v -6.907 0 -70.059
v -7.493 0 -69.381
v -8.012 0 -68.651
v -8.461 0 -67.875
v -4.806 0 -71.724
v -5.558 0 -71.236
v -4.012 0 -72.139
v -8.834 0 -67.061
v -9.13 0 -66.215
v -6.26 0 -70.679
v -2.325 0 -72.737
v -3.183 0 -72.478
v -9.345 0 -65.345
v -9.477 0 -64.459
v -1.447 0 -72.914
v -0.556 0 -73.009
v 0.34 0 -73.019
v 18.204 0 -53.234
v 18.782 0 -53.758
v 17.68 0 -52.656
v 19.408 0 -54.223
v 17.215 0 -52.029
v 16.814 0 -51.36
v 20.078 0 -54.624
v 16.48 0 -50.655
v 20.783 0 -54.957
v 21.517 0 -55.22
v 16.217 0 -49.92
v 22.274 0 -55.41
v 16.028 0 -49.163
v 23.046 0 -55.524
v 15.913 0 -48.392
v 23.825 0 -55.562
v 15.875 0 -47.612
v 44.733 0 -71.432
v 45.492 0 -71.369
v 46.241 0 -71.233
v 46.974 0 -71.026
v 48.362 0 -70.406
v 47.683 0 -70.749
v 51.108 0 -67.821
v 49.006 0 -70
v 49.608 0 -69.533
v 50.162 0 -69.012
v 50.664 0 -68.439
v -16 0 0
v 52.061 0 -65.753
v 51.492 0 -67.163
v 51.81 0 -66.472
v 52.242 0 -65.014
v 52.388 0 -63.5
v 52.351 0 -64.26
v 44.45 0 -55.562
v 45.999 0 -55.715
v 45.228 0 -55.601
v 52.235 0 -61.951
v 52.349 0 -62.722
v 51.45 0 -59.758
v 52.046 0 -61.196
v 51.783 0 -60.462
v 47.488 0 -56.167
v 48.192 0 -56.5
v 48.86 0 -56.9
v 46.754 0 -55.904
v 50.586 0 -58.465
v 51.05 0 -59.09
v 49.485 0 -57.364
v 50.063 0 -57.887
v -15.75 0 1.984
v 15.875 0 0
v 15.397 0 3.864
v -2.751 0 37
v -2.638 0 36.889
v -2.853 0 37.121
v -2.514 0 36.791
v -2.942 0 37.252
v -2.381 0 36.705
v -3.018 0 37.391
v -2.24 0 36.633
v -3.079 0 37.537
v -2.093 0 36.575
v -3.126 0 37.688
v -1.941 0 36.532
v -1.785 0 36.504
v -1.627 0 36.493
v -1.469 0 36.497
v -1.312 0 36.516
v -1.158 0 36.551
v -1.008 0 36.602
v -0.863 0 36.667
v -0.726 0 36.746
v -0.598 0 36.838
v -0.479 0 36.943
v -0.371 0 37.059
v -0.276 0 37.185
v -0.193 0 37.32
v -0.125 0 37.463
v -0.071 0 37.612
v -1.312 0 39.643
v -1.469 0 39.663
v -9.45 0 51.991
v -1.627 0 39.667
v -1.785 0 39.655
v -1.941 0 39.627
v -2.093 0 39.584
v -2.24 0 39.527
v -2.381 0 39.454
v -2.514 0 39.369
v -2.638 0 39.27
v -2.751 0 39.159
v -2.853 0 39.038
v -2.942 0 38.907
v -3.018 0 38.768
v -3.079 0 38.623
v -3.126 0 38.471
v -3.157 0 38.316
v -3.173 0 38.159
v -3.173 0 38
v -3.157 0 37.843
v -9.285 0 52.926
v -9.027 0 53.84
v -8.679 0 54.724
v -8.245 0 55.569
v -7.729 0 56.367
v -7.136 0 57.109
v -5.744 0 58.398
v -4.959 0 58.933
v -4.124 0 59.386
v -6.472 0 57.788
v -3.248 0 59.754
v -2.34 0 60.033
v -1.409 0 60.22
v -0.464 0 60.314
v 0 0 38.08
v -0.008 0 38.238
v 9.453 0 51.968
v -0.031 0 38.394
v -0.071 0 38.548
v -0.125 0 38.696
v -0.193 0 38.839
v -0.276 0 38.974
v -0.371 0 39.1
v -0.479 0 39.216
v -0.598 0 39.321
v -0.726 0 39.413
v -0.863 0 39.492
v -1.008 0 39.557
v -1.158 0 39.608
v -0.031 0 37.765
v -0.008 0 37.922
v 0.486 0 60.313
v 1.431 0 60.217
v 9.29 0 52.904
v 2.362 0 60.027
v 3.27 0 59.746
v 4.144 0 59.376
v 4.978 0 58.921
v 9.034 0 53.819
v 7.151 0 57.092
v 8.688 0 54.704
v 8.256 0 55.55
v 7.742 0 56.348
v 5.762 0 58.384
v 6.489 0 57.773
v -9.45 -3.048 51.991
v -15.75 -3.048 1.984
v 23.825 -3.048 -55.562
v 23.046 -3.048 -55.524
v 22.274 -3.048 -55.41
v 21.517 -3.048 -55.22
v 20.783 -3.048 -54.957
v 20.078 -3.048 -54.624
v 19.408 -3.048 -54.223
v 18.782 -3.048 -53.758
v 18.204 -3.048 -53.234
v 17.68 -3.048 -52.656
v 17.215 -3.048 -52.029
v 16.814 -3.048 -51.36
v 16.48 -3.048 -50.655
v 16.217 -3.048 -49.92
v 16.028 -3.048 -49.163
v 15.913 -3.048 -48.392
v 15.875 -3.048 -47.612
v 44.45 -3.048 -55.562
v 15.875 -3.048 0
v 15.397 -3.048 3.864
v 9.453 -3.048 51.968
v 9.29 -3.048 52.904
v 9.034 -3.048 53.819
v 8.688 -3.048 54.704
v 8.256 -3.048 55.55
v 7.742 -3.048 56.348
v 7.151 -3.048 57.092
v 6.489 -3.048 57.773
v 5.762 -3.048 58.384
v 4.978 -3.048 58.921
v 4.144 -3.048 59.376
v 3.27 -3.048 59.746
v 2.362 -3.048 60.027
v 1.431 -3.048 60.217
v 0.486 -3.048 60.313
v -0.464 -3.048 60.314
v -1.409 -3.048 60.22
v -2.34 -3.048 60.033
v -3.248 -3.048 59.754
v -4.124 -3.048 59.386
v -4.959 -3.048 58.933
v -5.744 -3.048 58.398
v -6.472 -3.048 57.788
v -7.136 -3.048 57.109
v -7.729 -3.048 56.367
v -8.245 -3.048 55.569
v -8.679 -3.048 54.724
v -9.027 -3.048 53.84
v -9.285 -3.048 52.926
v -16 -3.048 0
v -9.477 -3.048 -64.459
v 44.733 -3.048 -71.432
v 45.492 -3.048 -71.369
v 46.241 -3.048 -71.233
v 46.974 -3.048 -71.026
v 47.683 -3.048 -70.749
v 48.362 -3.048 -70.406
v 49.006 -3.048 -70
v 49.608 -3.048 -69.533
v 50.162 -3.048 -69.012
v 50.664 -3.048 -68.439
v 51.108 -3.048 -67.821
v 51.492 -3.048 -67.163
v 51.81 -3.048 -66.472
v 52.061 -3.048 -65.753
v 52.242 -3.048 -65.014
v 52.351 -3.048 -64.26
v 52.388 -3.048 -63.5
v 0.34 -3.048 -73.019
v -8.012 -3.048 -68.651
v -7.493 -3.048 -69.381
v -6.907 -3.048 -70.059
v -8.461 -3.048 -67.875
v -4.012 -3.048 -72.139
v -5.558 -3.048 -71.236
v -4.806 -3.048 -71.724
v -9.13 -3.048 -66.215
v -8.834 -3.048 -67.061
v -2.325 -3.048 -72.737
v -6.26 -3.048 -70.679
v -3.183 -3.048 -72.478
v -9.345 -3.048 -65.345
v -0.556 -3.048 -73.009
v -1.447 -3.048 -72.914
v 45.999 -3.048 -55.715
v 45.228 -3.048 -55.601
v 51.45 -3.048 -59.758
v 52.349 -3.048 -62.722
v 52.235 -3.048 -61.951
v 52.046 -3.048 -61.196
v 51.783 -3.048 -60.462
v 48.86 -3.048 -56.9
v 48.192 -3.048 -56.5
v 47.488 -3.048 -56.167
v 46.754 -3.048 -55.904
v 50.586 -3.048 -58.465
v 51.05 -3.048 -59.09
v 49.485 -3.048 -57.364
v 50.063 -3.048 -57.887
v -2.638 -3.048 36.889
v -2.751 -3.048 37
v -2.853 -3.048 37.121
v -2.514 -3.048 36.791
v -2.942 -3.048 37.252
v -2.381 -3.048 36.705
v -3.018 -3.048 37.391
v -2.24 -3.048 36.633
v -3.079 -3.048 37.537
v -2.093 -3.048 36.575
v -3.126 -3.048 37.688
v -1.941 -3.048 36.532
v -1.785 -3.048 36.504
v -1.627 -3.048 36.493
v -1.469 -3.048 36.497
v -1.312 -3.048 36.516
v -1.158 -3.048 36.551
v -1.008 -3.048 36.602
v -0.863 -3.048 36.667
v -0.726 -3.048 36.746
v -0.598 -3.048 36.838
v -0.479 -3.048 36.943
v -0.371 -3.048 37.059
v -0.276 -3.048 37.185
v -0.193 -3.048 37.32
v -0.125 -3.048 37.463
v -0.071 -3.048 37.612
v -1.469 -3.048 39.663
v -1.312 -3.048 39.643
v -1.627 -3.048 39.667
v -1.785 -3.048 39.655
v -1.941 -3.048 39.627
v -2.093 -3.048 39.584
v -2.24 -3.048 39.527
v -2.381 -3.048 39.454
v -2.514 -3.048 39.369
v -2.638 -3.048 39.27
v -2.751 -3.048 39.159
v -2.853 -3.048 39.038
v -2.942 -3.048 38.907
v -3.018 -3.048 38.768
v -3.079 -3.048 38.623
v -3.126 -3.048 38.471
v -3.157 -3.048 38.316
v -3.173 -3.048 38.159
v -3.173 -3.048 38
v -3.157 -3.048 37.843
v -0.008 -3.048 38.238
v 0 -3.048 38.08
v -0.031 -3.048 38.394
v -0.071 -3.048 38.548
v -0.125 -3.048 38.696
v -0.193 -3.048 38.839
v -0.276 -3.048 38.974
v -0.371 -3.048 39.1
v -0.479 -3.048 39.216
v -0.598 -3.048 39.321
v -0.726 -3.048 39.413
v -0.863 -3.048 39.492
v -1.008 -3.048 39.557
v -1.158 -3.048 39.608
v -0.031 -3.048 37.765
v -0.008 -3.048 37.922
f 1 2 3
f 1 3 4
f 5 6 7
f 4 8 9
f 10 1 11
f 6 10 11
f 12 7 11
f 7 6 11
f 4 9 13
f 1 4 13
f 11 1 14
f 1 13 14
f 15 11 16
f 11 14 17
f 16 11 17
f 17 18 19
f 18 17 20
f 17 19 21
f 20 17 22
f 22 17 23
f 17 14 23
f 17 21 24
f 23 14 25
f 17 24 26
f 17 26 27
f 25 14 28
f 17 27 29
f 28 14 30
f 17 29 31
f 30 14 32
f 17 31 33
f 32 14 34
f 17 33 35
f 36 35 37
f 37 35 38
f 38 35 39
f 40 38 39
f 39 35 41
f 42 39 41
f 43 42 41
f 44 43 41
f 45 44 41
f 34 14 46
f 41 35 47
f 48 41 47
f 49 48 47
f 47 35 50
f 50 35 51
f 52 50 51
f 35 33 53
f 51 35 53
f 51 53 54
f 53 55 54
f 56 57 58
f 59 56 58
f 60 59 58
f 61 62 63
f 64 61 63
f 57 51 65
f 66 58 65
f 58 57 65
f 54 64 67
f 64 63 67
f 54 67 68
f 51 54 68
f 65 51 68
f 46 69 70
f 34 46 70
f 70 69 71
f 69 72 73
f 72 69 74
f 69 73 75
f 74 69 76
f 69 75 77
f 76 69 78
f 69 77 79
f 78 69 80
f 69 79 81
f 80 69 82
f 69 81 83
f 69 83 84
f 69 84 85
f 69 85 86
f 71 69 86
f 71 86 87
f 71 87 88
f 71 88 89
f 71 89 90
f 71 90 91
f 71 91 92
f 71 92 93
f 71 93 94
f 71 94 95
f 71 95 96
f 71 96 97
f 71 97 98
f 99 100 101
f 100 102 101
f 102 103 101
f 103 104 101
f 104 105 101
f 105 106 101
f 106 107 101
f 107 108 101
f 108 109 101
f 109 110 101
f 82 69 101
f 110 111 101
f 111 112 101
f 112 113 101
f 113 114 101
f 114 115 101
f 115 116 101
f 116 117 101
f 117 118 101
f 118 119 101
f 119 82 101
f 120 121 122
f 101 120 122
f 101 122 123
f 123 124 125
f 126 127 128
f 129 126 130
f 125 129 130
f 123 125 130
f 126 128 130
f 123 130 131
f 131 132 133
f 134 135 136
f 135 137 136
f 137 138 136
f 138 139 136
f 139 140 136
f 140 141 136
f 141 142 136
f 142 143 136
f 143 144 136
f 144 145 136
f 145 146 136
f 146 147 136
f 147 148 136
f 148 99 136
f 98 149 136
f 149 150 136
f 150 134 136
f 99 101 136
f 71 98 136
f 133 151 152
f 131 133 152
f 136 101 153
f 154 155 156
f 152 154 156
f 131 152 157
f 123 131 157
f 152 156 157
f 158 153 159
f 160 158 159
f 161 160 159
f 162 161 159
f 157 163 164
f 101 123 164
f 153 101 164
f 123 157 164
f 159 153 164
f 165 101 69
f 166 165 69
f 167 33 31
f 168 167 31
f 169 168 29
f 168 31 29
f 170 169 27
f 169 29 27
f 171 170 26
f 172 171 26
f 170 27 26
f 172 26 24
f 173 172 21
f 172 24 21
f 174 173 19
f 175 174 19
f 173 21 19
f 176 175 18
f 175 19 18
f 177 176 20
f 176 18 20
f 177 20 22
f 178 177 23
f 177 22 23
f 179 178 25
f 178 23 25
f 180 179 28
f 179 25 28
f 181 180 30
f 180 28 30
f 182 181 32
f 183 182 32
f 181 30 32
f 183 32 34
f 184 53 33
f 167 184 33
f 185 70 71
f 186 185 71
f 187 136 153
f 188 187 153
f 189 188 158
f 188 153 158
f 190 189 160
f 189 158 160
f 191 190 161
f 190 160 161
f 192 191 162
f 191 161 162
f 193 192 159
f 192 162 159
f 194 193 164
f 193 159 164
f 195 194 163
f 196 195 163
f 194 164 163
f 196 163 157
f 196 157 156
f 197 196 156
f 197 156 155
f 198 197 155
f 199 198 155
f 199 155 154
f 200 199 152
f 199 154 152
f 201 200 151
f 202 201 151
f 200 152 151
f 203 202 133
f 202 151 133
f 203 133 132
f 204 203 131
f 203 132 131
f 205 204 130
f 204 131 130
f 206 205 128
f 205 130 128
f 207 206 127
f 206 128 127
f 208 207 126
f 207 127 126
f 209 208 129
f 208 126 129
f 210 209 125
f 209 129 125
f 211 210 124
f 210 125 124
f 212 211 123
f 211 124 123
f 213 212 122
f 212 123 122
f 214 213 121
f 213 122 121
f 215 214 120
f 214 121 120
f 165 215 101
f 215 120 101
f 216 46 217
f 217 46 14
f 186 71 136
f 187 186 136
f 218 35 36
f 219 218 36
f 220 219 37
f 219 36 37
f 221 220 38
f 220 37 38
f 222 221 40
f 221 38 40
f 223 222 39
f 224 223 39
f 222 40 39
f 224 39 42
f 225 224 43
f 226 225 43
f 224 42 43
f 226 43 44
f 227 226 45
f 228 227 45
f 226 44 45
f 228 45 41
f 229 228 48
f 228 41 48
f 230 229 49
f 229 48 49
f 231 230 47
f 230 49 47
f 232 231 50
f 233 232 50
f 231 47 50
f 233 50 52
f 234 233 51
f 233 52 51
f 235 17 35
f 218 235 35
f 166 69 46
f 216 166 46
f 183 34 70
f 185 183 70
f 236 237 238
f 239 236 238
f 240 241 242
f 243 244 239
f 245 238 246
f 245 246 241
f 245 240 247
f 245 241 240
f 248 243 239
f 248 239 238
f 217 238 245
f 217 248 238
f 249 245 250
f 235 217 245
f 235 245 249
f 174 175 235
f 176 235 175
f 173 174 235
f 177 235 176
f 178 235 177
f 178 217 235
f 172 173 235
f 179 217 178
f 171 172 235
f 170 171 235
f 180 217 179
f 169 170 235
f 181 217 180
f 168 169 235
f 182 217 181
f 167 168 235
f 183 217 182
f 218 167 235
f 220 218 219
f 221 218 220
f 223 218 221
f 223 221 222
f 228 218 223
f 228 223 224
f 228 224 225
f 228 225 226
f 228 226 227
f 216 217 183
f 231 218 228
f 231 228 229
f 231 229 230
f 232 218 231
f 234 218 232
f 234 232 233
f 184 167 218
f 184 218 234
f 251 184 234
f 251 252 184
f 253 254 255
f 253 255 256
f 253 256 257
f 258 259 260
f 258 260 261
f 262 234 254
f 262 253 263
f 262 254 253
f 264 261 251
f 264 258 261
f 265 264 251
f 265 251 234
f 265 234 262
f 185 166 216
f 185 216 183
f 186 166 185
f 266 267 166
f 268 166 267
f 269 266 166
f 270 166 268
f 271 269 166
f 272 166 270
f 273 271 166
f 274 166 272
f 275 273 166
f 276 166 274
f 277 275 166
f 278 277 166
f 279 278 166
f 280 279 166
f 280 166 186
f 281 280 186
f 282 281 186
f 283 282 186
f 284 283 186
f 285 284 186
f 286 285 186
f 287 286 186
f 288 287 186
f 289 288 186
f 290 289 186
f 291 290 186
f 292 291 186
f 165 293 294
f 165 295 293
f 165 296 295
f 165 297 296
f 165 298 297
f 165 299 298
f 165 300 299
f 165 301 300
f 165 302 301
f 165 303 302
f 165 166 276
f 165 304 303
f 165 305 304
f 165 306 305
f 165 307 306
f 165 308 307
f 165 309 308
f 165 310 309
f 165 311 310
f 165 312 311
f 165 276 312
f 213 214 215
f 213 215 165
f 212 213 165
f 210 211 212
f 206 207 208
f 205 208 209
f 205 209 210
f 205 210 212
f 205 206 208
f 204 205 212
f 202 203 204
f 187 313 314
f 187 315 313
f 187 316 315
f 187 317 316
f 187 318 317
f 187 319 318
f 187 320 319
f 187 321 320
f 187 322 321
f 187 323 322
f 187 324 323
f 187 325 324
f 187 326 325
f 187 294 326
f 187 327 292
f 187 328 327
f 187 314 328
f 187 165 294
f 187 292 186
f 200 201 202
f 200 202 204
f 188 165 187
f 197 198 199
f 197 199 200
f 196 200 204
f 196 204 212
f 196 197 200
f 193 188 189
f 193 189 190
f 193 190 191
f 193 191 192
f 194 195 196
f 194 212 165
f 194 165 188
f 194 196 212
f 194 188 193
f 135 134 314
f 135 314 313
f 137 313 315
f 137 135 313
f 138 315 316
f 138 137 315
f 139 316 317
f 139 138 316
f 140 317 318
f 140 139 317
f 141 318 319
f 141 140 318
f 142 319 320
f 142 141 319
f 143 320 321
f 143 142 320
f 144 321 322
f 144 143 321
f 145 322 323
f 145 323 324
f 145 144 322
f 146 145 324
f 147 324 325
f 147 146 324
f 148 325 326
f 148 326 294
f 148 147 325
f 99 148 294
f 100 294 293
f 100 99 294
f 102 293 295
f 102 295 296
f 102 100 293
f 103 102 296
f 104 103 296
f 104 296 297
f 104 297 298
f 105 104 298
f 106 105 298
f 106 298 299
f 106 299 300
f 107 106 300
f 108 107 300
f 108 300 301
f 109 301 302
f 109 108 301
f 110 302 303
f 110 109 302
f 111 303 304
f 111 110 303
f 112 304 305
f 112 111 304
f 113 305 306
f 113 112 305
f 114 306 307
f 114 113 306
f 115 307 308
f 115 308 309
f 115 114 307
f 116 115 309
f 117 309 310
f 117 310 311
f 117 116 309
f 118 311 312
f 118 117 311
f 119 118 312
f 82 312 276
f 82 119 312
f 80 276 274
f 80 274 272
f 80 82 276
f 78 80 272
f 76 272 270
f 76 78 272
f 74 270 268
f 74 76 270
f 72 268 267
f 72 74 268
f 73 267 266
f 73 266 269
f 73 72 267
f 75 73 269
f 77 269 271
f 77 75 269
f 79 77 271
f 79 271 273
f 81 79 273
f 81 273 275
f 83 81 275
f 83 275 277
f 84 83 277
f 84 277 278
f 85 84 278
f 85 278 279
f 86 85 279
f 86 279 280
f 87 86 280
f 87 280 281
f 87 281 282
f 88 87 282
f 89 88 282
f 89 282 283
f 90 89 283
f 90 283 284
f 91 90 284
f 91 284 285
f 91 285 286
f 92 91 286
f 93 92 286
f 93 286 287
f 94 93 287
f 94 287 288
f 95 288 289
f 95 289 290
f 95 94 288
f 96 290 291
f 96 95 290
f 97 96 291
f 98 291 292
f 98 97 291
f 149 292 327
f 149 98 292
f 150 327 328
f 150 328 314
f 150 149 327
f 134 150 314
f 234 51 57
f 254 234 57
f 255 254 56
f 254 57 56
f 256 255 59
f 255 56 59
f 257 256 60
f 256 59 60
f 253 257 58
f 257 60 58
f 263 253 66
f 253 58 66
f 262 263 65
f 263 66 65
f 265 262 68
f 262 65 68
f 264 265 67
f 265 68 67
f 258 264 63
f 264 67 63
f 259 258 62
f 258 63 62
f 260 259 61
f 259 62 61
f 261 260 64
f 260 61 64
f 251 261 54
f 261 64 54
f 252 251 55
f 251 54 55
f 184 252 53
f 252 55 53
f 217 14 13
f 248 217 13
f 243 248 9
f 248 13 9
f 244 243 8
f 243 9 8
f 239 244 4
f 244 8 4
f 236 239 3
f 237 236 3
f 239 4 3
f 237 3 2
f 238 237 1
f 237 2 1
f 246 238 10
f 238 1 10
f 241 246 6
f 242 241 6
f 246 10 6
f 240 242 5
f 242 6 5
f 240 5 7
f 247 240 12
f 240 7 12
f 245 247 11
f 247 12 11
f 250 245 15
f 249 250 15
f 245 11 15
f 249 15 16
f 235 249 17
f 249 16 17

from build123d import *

# Parameters (mm, degrees)
F0_R     = 1.5875
F1_DEPTH = 3.048


with BuildPart() as f1:
    # F0 (on Front) → F1 (new body)
    with BuildSketch(Plane.XZ):
        with BuildLine():
            Line((0, 38.0796237513), (0, 41.275))
            ThreePointArc((0, 41.275), (-7.14375, 44.4998046905), (-9.4502929642, 51.990625))
            Line((-9.4502929642, 51.990625), (-15.7504883039, 1.9843747602))
            ThreePointArc((-15.7504883039, 1.9843747602), (-10.5003256064, 11.9062499201), (0, 15.875))
            Line((0, 15.875), (0, 38.0796237513))
        make_face()
        with Locations((-1.5875, 38.0796237513)):
            Circle(F0_R, mode=Mode.SUBTRACT)
        with BuildLine():
            ThreePointArc((9.525, 50.8), (6.7351920908, 44.0648079092), (0, 41.275))
            Line((0, 41.275), (0, 38.0796237513))
            Line((0, 38.0796237513), (0, 15.875))
            ThreePointArc((0, 15.875), (9.76389722, 12.5172655192), (15.3974543628, 3.8644565138))
            Line((15.3974543628, 3.8644565138), (9.4530967593, 51.9681552373))
            ThreePointArc((9.4530967593, 51.9681552373), (9.5070071956, 51.3851830343), (9.525, 50.8))
        make_face()
        with BuildLine():
            ThreePointArc((15.3974543628, 3.8644565138), (9.76389722, 12.5172655192), (0, 15.875))
            Line((0, 15.875), (0, -15.875))
            ThreePointArc((0, -15.875), (11.2253201513, -11.2253201513), (15.875, 0))
            Line((15.875, 0), (15.3974543628, 3.8644565138))
        make_face()
        with BuildLine():
            Line((0, -15.875), (0, 15.875))
            ThreePointArc((0, 15.875), (-10.5003256064, 11.9062499201), (-15.7504883039, 1.9843747602))
            ThreePointArc((-15.7504883039, 1.9843747602), (-11.9062499201, -10.5003256064), (0, -15.875))
        make_face()
        with BuildLine():
            ThreePointArc((15.875, 0), (11.2253201513, -11.2253201513), (0, -15.875))
            Line((0, -15.875), (0, -53.975))
            ThreePointArc((0, -53.975), (6.7351920908, -56.7648079092), (9.525, -63.5))
            Line((9.525, -63.5), (36.5125, -63.5))
            ThreePointArc((36.5125, -63.5), (38.8373399243, -57.8873399243), (44.45, -55.5625))
            Line((44.45, -55.5625), (23.8252, -55.5625))
            ThreePointArc((23.8252, -55.5625), (18.2035596682, -53.2339403318), (15.875, -47.6123))
            Line((15.875, -47.6123), (15.875, 0))
        make_face()
        with BuildLine():
            ThreePointArc((0, -15.875), (-11.9062499201, -10.5003256064), (-15.7504883039, 1.9843747602))
            Line((-15.7504883039, 1.9843747602), (-16.0004960241, 0))
            Line((-16.0004960241, 0), (-9.4765871109, -64.4591255022))
            ThreePointArc((-9.4765871109, -64.4591255022), (-7.0661621623, -57.1129054105), (0, -53.975))
            Line((0, -53.975), (0, -15.875))
        make_face()
        with BuildLine():
            ThreePointArc((9.525, -63.5), (6.7351920908, -56.7648079092), (0, -53.975))
            Line((0, -53.975), (0, -63.5))
            Line((0, -63.5), (9.525, -63.5))
        make_face()
        with BuildLine():
            Line((0, -63.5), (0, -53.975))
            ThreePointArc((0, -53.975), (-7.0661621623, -57.1129054105), (-9.4765871109, -64.4591255022))
            ThreePointArc((-9.4765871109, -64.4591255022), (-6.2598742362, -70.6791085482), (0.3401785714, -73.0189234444))
            ThreePointArc((0.3401785714, -73.0189234444), (6.8544082857, -70.1138273378), (9.525, -63.5))
            Line((9.525, -63.5), (0, -63.5))
        make_face()
        with BuildLine():
            Line((36.5125, -63.5), (9.525, -63.5))
            ThreePointArc((9.525, -63.5), (6.8544082857, -70.1138273378), (0.3401785714, -73.0189234444))
            Line((0.3401785714, -73.0189234444), (44.7334821429, -71.4324362036))
            ThreePointArc((44.7334821429, -71.4324362036), (38.9384772185, -69.2120069047), (36.5125, -63.5))
        make_face()
        with BuildLine():
            ThreePointArc((-9.4502929642, 51.990625), (-7.14375, 44.4998046905), (0, 41.275))
            ThreePointArc((0, 41.275), (6.7351920908, 44.0648079092), (9.525, 50.8))
            ThreePointArc((9.525, 50.8), (9.5070071956, 51.3851830343), (9.4530967593, 51.9681552373))
            ThreePointArc((9.4530967593, 51.9681552373), (0.0113220085, 60.324993271), (-9.4502929642, 51.990625))
        make_face()
        with BuildLine():
            ThreePointArc((44.45, -55.5625), (38.8373399243, -57.8873399243), (36.5125, -63.5))
            ThreePointArc((36.5125, -63.5), (38.9384772185, -69.2120069047), (44.7334821429, -71.4324362036))
            ThreePointArc((44.7334821429, -71.4324362036), (50.1620069047, -69.0115227815), (52.3875, -63.5))
            ThreePointArc((52.3875, -63.5), (50.0626600757, -57.8873399243), (44.45, -55.5625))
        make_face()
    extrude(amount=F1_DEPTH)


solid = f1.part
